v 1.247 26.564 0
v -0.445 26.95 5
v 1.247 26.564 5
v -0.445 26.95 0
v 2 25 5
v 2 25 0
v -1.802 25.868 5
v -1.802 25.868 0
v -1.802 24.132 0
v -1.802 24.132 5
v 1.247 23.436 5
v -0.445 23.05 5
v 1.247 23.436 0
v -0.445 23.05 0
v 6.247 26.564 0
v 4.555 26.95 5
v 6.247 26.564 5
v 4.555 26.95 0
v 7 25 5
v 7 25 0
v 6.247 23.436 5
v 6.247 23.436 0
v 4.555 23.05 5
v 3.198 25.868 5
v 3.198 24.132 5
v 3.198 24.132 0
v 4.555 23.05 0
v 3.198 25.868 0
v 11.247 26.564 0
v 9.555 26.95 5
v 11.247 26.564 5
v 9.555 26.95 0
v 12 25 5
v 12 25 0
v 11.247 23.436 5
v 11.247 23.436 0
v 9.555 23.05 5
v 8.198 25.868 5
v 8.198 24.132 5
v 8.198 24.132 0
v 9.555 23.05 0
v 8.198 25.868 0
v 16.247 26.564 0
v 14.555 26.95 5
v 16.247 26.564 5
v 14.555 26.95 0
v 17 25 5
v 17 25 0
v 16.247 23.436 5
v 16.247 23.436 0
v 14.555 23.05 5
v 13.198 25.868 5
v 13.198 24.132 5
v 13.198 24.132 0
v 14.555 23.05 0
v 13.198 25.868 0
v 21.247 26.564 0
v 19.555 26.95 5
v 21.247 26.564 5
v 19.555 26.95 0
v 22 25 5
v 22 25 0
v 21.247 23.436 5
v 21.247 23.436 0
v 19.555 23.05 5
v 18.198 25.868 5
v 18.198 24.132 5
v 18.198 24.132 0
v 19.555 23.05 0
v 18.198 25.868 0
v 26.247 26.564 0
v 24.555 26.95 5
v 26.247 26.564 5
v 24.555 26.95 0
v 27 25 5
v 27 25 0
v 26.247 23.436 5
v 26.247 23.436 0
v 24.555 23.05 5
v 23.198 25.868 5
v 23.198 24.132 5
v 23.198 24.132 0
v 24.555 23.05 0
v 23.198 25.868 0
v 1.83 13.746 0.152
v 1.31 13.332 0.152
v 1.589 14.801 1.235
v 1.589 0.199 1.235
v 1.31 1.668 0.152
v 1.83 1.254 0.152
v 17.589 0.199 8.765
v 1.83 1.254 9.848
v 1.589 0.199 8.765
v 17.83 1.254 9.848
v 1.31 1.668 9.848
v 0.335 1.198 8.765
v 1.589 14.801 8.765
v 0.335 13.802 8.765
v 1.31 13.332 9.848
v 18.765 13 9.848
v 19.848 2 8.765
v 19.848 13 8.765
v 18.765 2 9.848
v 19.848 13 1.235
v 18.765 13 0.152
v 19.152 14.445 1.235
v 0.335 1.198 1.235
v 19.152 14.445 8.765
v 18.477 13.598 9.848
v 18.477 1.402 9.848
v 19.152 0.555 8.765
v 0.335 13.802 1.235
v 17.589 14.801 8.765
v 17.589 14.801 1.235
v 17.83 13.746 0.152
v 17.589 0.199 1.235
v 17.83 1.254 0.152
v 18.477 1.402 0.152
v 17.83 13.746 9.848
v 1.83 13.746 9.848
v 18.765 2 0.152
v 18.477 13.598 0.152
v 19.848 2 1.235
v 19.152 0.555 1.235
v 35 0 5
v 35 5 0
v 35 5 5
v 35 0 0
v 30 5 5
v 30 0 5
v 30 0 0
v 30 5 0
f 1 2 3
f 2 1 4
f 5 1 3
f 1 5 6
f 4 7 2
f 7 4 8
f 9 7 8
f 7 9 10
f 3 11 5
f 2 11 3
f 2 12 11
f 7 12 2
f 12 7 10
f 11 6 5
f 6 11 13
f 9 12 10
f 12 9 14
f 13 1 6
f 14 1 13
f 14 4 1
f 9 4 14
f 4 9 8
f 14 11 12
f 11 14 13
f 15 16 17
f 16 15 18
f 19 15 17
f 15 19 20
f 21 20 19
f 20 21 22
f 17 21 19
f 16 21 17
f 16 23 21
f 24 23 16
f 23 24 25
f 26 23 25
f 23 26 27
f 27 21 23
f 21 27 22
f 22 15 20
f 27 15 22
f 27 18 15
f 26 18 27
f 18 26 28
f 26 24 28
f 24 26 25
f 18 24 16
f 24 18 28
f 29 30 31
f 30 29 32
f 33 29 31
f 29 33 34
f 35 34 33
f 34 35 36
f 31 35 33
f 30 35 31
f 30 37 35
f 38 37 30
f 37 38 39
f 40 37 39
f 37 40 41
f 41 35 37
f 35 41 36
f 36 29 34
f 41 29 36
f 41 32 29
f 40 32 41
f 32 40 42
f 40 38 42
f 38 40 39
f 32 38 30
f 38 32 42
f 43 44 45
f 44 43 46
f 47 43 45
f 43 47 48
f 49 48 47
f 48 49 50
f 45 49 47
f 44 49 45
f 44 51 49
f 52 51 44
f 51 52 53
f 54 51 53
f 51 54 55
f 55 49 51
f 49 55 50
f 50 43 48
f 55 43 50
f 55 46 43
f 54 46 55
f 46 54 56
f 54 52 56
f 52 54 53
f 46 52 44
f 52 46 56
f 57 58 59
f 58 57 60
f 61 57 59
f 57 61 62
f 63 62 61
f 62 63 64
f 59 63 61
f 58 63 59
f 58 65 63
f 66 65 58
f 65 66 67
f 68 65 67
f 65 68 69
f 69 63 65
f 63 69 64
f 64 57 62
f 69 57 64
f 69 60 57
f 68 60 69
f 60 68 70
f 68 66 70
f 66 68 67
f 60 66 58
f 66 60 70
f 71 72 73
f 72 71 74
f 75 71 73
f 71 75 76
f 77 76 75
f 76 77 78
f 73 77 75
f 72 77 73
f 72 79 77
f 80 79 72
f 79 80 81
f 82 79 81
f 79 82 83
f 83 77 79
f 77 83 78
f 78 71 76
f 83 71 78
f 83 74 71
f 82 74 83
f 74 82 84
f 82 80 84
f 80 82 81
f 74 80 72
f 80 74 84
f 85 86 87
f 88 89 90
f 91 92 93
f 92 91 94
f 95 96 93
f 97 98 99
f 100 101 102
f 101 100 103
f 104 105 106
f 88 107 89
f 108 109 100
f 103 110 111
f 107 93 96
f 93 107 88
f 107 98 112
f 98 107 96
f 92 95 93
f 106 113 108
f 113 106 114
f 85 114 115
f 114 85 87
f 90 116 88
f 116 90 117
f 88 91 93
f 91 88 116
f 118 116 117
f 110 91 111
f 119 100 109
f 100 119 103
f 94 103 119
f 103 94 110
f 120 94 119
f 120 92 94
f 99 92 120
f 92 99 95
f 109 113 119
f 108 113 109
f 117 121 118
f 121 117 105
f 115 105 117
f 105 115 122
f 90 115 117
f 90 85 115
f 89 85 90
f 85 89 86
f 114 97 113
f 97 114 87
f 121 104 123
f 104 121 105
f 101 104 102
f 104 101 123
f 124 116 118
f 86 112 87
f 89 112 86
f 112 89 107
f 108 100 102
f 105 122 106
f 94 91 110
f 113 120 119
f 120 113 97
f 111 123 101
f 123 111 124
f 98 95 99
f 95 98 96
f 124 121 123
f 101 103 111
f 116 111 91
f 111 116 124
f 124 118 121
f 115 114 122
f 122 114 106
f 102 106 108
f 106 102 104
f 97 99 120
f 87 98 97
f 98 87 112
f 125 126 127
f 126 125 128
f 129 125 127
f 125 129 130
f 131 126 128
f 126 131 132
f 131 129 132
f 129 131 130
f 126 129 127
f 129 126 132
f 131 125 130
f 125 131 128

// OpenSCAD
// Example OpenSCAD code with various features
module roundedBox(size, radius) {
  x = size[0];
  y = size[1];
  z = size[2];
  
  translate([radius, radius, radius])
  minkowski() {
    cube([x-2*radius, y-2*radius, z-2*radius]);
    sphere(r=radius);
  }
}

// Variables and expressions
radius = 2;
width = 20;
height = 15;
depth = 10;

// Using the module
translate([0, 0, 0])
  roundedBox([width, height, depth], radius);

// If statement example
if (width > 15) {
  translate([width+10, 0, 0])
    cube([5, 5, 5]);
}

// For loop example  
for (i = [0:5:25]) {
  translate([i, height+10, 0])
    cylinder(h=5, r=2);
}
